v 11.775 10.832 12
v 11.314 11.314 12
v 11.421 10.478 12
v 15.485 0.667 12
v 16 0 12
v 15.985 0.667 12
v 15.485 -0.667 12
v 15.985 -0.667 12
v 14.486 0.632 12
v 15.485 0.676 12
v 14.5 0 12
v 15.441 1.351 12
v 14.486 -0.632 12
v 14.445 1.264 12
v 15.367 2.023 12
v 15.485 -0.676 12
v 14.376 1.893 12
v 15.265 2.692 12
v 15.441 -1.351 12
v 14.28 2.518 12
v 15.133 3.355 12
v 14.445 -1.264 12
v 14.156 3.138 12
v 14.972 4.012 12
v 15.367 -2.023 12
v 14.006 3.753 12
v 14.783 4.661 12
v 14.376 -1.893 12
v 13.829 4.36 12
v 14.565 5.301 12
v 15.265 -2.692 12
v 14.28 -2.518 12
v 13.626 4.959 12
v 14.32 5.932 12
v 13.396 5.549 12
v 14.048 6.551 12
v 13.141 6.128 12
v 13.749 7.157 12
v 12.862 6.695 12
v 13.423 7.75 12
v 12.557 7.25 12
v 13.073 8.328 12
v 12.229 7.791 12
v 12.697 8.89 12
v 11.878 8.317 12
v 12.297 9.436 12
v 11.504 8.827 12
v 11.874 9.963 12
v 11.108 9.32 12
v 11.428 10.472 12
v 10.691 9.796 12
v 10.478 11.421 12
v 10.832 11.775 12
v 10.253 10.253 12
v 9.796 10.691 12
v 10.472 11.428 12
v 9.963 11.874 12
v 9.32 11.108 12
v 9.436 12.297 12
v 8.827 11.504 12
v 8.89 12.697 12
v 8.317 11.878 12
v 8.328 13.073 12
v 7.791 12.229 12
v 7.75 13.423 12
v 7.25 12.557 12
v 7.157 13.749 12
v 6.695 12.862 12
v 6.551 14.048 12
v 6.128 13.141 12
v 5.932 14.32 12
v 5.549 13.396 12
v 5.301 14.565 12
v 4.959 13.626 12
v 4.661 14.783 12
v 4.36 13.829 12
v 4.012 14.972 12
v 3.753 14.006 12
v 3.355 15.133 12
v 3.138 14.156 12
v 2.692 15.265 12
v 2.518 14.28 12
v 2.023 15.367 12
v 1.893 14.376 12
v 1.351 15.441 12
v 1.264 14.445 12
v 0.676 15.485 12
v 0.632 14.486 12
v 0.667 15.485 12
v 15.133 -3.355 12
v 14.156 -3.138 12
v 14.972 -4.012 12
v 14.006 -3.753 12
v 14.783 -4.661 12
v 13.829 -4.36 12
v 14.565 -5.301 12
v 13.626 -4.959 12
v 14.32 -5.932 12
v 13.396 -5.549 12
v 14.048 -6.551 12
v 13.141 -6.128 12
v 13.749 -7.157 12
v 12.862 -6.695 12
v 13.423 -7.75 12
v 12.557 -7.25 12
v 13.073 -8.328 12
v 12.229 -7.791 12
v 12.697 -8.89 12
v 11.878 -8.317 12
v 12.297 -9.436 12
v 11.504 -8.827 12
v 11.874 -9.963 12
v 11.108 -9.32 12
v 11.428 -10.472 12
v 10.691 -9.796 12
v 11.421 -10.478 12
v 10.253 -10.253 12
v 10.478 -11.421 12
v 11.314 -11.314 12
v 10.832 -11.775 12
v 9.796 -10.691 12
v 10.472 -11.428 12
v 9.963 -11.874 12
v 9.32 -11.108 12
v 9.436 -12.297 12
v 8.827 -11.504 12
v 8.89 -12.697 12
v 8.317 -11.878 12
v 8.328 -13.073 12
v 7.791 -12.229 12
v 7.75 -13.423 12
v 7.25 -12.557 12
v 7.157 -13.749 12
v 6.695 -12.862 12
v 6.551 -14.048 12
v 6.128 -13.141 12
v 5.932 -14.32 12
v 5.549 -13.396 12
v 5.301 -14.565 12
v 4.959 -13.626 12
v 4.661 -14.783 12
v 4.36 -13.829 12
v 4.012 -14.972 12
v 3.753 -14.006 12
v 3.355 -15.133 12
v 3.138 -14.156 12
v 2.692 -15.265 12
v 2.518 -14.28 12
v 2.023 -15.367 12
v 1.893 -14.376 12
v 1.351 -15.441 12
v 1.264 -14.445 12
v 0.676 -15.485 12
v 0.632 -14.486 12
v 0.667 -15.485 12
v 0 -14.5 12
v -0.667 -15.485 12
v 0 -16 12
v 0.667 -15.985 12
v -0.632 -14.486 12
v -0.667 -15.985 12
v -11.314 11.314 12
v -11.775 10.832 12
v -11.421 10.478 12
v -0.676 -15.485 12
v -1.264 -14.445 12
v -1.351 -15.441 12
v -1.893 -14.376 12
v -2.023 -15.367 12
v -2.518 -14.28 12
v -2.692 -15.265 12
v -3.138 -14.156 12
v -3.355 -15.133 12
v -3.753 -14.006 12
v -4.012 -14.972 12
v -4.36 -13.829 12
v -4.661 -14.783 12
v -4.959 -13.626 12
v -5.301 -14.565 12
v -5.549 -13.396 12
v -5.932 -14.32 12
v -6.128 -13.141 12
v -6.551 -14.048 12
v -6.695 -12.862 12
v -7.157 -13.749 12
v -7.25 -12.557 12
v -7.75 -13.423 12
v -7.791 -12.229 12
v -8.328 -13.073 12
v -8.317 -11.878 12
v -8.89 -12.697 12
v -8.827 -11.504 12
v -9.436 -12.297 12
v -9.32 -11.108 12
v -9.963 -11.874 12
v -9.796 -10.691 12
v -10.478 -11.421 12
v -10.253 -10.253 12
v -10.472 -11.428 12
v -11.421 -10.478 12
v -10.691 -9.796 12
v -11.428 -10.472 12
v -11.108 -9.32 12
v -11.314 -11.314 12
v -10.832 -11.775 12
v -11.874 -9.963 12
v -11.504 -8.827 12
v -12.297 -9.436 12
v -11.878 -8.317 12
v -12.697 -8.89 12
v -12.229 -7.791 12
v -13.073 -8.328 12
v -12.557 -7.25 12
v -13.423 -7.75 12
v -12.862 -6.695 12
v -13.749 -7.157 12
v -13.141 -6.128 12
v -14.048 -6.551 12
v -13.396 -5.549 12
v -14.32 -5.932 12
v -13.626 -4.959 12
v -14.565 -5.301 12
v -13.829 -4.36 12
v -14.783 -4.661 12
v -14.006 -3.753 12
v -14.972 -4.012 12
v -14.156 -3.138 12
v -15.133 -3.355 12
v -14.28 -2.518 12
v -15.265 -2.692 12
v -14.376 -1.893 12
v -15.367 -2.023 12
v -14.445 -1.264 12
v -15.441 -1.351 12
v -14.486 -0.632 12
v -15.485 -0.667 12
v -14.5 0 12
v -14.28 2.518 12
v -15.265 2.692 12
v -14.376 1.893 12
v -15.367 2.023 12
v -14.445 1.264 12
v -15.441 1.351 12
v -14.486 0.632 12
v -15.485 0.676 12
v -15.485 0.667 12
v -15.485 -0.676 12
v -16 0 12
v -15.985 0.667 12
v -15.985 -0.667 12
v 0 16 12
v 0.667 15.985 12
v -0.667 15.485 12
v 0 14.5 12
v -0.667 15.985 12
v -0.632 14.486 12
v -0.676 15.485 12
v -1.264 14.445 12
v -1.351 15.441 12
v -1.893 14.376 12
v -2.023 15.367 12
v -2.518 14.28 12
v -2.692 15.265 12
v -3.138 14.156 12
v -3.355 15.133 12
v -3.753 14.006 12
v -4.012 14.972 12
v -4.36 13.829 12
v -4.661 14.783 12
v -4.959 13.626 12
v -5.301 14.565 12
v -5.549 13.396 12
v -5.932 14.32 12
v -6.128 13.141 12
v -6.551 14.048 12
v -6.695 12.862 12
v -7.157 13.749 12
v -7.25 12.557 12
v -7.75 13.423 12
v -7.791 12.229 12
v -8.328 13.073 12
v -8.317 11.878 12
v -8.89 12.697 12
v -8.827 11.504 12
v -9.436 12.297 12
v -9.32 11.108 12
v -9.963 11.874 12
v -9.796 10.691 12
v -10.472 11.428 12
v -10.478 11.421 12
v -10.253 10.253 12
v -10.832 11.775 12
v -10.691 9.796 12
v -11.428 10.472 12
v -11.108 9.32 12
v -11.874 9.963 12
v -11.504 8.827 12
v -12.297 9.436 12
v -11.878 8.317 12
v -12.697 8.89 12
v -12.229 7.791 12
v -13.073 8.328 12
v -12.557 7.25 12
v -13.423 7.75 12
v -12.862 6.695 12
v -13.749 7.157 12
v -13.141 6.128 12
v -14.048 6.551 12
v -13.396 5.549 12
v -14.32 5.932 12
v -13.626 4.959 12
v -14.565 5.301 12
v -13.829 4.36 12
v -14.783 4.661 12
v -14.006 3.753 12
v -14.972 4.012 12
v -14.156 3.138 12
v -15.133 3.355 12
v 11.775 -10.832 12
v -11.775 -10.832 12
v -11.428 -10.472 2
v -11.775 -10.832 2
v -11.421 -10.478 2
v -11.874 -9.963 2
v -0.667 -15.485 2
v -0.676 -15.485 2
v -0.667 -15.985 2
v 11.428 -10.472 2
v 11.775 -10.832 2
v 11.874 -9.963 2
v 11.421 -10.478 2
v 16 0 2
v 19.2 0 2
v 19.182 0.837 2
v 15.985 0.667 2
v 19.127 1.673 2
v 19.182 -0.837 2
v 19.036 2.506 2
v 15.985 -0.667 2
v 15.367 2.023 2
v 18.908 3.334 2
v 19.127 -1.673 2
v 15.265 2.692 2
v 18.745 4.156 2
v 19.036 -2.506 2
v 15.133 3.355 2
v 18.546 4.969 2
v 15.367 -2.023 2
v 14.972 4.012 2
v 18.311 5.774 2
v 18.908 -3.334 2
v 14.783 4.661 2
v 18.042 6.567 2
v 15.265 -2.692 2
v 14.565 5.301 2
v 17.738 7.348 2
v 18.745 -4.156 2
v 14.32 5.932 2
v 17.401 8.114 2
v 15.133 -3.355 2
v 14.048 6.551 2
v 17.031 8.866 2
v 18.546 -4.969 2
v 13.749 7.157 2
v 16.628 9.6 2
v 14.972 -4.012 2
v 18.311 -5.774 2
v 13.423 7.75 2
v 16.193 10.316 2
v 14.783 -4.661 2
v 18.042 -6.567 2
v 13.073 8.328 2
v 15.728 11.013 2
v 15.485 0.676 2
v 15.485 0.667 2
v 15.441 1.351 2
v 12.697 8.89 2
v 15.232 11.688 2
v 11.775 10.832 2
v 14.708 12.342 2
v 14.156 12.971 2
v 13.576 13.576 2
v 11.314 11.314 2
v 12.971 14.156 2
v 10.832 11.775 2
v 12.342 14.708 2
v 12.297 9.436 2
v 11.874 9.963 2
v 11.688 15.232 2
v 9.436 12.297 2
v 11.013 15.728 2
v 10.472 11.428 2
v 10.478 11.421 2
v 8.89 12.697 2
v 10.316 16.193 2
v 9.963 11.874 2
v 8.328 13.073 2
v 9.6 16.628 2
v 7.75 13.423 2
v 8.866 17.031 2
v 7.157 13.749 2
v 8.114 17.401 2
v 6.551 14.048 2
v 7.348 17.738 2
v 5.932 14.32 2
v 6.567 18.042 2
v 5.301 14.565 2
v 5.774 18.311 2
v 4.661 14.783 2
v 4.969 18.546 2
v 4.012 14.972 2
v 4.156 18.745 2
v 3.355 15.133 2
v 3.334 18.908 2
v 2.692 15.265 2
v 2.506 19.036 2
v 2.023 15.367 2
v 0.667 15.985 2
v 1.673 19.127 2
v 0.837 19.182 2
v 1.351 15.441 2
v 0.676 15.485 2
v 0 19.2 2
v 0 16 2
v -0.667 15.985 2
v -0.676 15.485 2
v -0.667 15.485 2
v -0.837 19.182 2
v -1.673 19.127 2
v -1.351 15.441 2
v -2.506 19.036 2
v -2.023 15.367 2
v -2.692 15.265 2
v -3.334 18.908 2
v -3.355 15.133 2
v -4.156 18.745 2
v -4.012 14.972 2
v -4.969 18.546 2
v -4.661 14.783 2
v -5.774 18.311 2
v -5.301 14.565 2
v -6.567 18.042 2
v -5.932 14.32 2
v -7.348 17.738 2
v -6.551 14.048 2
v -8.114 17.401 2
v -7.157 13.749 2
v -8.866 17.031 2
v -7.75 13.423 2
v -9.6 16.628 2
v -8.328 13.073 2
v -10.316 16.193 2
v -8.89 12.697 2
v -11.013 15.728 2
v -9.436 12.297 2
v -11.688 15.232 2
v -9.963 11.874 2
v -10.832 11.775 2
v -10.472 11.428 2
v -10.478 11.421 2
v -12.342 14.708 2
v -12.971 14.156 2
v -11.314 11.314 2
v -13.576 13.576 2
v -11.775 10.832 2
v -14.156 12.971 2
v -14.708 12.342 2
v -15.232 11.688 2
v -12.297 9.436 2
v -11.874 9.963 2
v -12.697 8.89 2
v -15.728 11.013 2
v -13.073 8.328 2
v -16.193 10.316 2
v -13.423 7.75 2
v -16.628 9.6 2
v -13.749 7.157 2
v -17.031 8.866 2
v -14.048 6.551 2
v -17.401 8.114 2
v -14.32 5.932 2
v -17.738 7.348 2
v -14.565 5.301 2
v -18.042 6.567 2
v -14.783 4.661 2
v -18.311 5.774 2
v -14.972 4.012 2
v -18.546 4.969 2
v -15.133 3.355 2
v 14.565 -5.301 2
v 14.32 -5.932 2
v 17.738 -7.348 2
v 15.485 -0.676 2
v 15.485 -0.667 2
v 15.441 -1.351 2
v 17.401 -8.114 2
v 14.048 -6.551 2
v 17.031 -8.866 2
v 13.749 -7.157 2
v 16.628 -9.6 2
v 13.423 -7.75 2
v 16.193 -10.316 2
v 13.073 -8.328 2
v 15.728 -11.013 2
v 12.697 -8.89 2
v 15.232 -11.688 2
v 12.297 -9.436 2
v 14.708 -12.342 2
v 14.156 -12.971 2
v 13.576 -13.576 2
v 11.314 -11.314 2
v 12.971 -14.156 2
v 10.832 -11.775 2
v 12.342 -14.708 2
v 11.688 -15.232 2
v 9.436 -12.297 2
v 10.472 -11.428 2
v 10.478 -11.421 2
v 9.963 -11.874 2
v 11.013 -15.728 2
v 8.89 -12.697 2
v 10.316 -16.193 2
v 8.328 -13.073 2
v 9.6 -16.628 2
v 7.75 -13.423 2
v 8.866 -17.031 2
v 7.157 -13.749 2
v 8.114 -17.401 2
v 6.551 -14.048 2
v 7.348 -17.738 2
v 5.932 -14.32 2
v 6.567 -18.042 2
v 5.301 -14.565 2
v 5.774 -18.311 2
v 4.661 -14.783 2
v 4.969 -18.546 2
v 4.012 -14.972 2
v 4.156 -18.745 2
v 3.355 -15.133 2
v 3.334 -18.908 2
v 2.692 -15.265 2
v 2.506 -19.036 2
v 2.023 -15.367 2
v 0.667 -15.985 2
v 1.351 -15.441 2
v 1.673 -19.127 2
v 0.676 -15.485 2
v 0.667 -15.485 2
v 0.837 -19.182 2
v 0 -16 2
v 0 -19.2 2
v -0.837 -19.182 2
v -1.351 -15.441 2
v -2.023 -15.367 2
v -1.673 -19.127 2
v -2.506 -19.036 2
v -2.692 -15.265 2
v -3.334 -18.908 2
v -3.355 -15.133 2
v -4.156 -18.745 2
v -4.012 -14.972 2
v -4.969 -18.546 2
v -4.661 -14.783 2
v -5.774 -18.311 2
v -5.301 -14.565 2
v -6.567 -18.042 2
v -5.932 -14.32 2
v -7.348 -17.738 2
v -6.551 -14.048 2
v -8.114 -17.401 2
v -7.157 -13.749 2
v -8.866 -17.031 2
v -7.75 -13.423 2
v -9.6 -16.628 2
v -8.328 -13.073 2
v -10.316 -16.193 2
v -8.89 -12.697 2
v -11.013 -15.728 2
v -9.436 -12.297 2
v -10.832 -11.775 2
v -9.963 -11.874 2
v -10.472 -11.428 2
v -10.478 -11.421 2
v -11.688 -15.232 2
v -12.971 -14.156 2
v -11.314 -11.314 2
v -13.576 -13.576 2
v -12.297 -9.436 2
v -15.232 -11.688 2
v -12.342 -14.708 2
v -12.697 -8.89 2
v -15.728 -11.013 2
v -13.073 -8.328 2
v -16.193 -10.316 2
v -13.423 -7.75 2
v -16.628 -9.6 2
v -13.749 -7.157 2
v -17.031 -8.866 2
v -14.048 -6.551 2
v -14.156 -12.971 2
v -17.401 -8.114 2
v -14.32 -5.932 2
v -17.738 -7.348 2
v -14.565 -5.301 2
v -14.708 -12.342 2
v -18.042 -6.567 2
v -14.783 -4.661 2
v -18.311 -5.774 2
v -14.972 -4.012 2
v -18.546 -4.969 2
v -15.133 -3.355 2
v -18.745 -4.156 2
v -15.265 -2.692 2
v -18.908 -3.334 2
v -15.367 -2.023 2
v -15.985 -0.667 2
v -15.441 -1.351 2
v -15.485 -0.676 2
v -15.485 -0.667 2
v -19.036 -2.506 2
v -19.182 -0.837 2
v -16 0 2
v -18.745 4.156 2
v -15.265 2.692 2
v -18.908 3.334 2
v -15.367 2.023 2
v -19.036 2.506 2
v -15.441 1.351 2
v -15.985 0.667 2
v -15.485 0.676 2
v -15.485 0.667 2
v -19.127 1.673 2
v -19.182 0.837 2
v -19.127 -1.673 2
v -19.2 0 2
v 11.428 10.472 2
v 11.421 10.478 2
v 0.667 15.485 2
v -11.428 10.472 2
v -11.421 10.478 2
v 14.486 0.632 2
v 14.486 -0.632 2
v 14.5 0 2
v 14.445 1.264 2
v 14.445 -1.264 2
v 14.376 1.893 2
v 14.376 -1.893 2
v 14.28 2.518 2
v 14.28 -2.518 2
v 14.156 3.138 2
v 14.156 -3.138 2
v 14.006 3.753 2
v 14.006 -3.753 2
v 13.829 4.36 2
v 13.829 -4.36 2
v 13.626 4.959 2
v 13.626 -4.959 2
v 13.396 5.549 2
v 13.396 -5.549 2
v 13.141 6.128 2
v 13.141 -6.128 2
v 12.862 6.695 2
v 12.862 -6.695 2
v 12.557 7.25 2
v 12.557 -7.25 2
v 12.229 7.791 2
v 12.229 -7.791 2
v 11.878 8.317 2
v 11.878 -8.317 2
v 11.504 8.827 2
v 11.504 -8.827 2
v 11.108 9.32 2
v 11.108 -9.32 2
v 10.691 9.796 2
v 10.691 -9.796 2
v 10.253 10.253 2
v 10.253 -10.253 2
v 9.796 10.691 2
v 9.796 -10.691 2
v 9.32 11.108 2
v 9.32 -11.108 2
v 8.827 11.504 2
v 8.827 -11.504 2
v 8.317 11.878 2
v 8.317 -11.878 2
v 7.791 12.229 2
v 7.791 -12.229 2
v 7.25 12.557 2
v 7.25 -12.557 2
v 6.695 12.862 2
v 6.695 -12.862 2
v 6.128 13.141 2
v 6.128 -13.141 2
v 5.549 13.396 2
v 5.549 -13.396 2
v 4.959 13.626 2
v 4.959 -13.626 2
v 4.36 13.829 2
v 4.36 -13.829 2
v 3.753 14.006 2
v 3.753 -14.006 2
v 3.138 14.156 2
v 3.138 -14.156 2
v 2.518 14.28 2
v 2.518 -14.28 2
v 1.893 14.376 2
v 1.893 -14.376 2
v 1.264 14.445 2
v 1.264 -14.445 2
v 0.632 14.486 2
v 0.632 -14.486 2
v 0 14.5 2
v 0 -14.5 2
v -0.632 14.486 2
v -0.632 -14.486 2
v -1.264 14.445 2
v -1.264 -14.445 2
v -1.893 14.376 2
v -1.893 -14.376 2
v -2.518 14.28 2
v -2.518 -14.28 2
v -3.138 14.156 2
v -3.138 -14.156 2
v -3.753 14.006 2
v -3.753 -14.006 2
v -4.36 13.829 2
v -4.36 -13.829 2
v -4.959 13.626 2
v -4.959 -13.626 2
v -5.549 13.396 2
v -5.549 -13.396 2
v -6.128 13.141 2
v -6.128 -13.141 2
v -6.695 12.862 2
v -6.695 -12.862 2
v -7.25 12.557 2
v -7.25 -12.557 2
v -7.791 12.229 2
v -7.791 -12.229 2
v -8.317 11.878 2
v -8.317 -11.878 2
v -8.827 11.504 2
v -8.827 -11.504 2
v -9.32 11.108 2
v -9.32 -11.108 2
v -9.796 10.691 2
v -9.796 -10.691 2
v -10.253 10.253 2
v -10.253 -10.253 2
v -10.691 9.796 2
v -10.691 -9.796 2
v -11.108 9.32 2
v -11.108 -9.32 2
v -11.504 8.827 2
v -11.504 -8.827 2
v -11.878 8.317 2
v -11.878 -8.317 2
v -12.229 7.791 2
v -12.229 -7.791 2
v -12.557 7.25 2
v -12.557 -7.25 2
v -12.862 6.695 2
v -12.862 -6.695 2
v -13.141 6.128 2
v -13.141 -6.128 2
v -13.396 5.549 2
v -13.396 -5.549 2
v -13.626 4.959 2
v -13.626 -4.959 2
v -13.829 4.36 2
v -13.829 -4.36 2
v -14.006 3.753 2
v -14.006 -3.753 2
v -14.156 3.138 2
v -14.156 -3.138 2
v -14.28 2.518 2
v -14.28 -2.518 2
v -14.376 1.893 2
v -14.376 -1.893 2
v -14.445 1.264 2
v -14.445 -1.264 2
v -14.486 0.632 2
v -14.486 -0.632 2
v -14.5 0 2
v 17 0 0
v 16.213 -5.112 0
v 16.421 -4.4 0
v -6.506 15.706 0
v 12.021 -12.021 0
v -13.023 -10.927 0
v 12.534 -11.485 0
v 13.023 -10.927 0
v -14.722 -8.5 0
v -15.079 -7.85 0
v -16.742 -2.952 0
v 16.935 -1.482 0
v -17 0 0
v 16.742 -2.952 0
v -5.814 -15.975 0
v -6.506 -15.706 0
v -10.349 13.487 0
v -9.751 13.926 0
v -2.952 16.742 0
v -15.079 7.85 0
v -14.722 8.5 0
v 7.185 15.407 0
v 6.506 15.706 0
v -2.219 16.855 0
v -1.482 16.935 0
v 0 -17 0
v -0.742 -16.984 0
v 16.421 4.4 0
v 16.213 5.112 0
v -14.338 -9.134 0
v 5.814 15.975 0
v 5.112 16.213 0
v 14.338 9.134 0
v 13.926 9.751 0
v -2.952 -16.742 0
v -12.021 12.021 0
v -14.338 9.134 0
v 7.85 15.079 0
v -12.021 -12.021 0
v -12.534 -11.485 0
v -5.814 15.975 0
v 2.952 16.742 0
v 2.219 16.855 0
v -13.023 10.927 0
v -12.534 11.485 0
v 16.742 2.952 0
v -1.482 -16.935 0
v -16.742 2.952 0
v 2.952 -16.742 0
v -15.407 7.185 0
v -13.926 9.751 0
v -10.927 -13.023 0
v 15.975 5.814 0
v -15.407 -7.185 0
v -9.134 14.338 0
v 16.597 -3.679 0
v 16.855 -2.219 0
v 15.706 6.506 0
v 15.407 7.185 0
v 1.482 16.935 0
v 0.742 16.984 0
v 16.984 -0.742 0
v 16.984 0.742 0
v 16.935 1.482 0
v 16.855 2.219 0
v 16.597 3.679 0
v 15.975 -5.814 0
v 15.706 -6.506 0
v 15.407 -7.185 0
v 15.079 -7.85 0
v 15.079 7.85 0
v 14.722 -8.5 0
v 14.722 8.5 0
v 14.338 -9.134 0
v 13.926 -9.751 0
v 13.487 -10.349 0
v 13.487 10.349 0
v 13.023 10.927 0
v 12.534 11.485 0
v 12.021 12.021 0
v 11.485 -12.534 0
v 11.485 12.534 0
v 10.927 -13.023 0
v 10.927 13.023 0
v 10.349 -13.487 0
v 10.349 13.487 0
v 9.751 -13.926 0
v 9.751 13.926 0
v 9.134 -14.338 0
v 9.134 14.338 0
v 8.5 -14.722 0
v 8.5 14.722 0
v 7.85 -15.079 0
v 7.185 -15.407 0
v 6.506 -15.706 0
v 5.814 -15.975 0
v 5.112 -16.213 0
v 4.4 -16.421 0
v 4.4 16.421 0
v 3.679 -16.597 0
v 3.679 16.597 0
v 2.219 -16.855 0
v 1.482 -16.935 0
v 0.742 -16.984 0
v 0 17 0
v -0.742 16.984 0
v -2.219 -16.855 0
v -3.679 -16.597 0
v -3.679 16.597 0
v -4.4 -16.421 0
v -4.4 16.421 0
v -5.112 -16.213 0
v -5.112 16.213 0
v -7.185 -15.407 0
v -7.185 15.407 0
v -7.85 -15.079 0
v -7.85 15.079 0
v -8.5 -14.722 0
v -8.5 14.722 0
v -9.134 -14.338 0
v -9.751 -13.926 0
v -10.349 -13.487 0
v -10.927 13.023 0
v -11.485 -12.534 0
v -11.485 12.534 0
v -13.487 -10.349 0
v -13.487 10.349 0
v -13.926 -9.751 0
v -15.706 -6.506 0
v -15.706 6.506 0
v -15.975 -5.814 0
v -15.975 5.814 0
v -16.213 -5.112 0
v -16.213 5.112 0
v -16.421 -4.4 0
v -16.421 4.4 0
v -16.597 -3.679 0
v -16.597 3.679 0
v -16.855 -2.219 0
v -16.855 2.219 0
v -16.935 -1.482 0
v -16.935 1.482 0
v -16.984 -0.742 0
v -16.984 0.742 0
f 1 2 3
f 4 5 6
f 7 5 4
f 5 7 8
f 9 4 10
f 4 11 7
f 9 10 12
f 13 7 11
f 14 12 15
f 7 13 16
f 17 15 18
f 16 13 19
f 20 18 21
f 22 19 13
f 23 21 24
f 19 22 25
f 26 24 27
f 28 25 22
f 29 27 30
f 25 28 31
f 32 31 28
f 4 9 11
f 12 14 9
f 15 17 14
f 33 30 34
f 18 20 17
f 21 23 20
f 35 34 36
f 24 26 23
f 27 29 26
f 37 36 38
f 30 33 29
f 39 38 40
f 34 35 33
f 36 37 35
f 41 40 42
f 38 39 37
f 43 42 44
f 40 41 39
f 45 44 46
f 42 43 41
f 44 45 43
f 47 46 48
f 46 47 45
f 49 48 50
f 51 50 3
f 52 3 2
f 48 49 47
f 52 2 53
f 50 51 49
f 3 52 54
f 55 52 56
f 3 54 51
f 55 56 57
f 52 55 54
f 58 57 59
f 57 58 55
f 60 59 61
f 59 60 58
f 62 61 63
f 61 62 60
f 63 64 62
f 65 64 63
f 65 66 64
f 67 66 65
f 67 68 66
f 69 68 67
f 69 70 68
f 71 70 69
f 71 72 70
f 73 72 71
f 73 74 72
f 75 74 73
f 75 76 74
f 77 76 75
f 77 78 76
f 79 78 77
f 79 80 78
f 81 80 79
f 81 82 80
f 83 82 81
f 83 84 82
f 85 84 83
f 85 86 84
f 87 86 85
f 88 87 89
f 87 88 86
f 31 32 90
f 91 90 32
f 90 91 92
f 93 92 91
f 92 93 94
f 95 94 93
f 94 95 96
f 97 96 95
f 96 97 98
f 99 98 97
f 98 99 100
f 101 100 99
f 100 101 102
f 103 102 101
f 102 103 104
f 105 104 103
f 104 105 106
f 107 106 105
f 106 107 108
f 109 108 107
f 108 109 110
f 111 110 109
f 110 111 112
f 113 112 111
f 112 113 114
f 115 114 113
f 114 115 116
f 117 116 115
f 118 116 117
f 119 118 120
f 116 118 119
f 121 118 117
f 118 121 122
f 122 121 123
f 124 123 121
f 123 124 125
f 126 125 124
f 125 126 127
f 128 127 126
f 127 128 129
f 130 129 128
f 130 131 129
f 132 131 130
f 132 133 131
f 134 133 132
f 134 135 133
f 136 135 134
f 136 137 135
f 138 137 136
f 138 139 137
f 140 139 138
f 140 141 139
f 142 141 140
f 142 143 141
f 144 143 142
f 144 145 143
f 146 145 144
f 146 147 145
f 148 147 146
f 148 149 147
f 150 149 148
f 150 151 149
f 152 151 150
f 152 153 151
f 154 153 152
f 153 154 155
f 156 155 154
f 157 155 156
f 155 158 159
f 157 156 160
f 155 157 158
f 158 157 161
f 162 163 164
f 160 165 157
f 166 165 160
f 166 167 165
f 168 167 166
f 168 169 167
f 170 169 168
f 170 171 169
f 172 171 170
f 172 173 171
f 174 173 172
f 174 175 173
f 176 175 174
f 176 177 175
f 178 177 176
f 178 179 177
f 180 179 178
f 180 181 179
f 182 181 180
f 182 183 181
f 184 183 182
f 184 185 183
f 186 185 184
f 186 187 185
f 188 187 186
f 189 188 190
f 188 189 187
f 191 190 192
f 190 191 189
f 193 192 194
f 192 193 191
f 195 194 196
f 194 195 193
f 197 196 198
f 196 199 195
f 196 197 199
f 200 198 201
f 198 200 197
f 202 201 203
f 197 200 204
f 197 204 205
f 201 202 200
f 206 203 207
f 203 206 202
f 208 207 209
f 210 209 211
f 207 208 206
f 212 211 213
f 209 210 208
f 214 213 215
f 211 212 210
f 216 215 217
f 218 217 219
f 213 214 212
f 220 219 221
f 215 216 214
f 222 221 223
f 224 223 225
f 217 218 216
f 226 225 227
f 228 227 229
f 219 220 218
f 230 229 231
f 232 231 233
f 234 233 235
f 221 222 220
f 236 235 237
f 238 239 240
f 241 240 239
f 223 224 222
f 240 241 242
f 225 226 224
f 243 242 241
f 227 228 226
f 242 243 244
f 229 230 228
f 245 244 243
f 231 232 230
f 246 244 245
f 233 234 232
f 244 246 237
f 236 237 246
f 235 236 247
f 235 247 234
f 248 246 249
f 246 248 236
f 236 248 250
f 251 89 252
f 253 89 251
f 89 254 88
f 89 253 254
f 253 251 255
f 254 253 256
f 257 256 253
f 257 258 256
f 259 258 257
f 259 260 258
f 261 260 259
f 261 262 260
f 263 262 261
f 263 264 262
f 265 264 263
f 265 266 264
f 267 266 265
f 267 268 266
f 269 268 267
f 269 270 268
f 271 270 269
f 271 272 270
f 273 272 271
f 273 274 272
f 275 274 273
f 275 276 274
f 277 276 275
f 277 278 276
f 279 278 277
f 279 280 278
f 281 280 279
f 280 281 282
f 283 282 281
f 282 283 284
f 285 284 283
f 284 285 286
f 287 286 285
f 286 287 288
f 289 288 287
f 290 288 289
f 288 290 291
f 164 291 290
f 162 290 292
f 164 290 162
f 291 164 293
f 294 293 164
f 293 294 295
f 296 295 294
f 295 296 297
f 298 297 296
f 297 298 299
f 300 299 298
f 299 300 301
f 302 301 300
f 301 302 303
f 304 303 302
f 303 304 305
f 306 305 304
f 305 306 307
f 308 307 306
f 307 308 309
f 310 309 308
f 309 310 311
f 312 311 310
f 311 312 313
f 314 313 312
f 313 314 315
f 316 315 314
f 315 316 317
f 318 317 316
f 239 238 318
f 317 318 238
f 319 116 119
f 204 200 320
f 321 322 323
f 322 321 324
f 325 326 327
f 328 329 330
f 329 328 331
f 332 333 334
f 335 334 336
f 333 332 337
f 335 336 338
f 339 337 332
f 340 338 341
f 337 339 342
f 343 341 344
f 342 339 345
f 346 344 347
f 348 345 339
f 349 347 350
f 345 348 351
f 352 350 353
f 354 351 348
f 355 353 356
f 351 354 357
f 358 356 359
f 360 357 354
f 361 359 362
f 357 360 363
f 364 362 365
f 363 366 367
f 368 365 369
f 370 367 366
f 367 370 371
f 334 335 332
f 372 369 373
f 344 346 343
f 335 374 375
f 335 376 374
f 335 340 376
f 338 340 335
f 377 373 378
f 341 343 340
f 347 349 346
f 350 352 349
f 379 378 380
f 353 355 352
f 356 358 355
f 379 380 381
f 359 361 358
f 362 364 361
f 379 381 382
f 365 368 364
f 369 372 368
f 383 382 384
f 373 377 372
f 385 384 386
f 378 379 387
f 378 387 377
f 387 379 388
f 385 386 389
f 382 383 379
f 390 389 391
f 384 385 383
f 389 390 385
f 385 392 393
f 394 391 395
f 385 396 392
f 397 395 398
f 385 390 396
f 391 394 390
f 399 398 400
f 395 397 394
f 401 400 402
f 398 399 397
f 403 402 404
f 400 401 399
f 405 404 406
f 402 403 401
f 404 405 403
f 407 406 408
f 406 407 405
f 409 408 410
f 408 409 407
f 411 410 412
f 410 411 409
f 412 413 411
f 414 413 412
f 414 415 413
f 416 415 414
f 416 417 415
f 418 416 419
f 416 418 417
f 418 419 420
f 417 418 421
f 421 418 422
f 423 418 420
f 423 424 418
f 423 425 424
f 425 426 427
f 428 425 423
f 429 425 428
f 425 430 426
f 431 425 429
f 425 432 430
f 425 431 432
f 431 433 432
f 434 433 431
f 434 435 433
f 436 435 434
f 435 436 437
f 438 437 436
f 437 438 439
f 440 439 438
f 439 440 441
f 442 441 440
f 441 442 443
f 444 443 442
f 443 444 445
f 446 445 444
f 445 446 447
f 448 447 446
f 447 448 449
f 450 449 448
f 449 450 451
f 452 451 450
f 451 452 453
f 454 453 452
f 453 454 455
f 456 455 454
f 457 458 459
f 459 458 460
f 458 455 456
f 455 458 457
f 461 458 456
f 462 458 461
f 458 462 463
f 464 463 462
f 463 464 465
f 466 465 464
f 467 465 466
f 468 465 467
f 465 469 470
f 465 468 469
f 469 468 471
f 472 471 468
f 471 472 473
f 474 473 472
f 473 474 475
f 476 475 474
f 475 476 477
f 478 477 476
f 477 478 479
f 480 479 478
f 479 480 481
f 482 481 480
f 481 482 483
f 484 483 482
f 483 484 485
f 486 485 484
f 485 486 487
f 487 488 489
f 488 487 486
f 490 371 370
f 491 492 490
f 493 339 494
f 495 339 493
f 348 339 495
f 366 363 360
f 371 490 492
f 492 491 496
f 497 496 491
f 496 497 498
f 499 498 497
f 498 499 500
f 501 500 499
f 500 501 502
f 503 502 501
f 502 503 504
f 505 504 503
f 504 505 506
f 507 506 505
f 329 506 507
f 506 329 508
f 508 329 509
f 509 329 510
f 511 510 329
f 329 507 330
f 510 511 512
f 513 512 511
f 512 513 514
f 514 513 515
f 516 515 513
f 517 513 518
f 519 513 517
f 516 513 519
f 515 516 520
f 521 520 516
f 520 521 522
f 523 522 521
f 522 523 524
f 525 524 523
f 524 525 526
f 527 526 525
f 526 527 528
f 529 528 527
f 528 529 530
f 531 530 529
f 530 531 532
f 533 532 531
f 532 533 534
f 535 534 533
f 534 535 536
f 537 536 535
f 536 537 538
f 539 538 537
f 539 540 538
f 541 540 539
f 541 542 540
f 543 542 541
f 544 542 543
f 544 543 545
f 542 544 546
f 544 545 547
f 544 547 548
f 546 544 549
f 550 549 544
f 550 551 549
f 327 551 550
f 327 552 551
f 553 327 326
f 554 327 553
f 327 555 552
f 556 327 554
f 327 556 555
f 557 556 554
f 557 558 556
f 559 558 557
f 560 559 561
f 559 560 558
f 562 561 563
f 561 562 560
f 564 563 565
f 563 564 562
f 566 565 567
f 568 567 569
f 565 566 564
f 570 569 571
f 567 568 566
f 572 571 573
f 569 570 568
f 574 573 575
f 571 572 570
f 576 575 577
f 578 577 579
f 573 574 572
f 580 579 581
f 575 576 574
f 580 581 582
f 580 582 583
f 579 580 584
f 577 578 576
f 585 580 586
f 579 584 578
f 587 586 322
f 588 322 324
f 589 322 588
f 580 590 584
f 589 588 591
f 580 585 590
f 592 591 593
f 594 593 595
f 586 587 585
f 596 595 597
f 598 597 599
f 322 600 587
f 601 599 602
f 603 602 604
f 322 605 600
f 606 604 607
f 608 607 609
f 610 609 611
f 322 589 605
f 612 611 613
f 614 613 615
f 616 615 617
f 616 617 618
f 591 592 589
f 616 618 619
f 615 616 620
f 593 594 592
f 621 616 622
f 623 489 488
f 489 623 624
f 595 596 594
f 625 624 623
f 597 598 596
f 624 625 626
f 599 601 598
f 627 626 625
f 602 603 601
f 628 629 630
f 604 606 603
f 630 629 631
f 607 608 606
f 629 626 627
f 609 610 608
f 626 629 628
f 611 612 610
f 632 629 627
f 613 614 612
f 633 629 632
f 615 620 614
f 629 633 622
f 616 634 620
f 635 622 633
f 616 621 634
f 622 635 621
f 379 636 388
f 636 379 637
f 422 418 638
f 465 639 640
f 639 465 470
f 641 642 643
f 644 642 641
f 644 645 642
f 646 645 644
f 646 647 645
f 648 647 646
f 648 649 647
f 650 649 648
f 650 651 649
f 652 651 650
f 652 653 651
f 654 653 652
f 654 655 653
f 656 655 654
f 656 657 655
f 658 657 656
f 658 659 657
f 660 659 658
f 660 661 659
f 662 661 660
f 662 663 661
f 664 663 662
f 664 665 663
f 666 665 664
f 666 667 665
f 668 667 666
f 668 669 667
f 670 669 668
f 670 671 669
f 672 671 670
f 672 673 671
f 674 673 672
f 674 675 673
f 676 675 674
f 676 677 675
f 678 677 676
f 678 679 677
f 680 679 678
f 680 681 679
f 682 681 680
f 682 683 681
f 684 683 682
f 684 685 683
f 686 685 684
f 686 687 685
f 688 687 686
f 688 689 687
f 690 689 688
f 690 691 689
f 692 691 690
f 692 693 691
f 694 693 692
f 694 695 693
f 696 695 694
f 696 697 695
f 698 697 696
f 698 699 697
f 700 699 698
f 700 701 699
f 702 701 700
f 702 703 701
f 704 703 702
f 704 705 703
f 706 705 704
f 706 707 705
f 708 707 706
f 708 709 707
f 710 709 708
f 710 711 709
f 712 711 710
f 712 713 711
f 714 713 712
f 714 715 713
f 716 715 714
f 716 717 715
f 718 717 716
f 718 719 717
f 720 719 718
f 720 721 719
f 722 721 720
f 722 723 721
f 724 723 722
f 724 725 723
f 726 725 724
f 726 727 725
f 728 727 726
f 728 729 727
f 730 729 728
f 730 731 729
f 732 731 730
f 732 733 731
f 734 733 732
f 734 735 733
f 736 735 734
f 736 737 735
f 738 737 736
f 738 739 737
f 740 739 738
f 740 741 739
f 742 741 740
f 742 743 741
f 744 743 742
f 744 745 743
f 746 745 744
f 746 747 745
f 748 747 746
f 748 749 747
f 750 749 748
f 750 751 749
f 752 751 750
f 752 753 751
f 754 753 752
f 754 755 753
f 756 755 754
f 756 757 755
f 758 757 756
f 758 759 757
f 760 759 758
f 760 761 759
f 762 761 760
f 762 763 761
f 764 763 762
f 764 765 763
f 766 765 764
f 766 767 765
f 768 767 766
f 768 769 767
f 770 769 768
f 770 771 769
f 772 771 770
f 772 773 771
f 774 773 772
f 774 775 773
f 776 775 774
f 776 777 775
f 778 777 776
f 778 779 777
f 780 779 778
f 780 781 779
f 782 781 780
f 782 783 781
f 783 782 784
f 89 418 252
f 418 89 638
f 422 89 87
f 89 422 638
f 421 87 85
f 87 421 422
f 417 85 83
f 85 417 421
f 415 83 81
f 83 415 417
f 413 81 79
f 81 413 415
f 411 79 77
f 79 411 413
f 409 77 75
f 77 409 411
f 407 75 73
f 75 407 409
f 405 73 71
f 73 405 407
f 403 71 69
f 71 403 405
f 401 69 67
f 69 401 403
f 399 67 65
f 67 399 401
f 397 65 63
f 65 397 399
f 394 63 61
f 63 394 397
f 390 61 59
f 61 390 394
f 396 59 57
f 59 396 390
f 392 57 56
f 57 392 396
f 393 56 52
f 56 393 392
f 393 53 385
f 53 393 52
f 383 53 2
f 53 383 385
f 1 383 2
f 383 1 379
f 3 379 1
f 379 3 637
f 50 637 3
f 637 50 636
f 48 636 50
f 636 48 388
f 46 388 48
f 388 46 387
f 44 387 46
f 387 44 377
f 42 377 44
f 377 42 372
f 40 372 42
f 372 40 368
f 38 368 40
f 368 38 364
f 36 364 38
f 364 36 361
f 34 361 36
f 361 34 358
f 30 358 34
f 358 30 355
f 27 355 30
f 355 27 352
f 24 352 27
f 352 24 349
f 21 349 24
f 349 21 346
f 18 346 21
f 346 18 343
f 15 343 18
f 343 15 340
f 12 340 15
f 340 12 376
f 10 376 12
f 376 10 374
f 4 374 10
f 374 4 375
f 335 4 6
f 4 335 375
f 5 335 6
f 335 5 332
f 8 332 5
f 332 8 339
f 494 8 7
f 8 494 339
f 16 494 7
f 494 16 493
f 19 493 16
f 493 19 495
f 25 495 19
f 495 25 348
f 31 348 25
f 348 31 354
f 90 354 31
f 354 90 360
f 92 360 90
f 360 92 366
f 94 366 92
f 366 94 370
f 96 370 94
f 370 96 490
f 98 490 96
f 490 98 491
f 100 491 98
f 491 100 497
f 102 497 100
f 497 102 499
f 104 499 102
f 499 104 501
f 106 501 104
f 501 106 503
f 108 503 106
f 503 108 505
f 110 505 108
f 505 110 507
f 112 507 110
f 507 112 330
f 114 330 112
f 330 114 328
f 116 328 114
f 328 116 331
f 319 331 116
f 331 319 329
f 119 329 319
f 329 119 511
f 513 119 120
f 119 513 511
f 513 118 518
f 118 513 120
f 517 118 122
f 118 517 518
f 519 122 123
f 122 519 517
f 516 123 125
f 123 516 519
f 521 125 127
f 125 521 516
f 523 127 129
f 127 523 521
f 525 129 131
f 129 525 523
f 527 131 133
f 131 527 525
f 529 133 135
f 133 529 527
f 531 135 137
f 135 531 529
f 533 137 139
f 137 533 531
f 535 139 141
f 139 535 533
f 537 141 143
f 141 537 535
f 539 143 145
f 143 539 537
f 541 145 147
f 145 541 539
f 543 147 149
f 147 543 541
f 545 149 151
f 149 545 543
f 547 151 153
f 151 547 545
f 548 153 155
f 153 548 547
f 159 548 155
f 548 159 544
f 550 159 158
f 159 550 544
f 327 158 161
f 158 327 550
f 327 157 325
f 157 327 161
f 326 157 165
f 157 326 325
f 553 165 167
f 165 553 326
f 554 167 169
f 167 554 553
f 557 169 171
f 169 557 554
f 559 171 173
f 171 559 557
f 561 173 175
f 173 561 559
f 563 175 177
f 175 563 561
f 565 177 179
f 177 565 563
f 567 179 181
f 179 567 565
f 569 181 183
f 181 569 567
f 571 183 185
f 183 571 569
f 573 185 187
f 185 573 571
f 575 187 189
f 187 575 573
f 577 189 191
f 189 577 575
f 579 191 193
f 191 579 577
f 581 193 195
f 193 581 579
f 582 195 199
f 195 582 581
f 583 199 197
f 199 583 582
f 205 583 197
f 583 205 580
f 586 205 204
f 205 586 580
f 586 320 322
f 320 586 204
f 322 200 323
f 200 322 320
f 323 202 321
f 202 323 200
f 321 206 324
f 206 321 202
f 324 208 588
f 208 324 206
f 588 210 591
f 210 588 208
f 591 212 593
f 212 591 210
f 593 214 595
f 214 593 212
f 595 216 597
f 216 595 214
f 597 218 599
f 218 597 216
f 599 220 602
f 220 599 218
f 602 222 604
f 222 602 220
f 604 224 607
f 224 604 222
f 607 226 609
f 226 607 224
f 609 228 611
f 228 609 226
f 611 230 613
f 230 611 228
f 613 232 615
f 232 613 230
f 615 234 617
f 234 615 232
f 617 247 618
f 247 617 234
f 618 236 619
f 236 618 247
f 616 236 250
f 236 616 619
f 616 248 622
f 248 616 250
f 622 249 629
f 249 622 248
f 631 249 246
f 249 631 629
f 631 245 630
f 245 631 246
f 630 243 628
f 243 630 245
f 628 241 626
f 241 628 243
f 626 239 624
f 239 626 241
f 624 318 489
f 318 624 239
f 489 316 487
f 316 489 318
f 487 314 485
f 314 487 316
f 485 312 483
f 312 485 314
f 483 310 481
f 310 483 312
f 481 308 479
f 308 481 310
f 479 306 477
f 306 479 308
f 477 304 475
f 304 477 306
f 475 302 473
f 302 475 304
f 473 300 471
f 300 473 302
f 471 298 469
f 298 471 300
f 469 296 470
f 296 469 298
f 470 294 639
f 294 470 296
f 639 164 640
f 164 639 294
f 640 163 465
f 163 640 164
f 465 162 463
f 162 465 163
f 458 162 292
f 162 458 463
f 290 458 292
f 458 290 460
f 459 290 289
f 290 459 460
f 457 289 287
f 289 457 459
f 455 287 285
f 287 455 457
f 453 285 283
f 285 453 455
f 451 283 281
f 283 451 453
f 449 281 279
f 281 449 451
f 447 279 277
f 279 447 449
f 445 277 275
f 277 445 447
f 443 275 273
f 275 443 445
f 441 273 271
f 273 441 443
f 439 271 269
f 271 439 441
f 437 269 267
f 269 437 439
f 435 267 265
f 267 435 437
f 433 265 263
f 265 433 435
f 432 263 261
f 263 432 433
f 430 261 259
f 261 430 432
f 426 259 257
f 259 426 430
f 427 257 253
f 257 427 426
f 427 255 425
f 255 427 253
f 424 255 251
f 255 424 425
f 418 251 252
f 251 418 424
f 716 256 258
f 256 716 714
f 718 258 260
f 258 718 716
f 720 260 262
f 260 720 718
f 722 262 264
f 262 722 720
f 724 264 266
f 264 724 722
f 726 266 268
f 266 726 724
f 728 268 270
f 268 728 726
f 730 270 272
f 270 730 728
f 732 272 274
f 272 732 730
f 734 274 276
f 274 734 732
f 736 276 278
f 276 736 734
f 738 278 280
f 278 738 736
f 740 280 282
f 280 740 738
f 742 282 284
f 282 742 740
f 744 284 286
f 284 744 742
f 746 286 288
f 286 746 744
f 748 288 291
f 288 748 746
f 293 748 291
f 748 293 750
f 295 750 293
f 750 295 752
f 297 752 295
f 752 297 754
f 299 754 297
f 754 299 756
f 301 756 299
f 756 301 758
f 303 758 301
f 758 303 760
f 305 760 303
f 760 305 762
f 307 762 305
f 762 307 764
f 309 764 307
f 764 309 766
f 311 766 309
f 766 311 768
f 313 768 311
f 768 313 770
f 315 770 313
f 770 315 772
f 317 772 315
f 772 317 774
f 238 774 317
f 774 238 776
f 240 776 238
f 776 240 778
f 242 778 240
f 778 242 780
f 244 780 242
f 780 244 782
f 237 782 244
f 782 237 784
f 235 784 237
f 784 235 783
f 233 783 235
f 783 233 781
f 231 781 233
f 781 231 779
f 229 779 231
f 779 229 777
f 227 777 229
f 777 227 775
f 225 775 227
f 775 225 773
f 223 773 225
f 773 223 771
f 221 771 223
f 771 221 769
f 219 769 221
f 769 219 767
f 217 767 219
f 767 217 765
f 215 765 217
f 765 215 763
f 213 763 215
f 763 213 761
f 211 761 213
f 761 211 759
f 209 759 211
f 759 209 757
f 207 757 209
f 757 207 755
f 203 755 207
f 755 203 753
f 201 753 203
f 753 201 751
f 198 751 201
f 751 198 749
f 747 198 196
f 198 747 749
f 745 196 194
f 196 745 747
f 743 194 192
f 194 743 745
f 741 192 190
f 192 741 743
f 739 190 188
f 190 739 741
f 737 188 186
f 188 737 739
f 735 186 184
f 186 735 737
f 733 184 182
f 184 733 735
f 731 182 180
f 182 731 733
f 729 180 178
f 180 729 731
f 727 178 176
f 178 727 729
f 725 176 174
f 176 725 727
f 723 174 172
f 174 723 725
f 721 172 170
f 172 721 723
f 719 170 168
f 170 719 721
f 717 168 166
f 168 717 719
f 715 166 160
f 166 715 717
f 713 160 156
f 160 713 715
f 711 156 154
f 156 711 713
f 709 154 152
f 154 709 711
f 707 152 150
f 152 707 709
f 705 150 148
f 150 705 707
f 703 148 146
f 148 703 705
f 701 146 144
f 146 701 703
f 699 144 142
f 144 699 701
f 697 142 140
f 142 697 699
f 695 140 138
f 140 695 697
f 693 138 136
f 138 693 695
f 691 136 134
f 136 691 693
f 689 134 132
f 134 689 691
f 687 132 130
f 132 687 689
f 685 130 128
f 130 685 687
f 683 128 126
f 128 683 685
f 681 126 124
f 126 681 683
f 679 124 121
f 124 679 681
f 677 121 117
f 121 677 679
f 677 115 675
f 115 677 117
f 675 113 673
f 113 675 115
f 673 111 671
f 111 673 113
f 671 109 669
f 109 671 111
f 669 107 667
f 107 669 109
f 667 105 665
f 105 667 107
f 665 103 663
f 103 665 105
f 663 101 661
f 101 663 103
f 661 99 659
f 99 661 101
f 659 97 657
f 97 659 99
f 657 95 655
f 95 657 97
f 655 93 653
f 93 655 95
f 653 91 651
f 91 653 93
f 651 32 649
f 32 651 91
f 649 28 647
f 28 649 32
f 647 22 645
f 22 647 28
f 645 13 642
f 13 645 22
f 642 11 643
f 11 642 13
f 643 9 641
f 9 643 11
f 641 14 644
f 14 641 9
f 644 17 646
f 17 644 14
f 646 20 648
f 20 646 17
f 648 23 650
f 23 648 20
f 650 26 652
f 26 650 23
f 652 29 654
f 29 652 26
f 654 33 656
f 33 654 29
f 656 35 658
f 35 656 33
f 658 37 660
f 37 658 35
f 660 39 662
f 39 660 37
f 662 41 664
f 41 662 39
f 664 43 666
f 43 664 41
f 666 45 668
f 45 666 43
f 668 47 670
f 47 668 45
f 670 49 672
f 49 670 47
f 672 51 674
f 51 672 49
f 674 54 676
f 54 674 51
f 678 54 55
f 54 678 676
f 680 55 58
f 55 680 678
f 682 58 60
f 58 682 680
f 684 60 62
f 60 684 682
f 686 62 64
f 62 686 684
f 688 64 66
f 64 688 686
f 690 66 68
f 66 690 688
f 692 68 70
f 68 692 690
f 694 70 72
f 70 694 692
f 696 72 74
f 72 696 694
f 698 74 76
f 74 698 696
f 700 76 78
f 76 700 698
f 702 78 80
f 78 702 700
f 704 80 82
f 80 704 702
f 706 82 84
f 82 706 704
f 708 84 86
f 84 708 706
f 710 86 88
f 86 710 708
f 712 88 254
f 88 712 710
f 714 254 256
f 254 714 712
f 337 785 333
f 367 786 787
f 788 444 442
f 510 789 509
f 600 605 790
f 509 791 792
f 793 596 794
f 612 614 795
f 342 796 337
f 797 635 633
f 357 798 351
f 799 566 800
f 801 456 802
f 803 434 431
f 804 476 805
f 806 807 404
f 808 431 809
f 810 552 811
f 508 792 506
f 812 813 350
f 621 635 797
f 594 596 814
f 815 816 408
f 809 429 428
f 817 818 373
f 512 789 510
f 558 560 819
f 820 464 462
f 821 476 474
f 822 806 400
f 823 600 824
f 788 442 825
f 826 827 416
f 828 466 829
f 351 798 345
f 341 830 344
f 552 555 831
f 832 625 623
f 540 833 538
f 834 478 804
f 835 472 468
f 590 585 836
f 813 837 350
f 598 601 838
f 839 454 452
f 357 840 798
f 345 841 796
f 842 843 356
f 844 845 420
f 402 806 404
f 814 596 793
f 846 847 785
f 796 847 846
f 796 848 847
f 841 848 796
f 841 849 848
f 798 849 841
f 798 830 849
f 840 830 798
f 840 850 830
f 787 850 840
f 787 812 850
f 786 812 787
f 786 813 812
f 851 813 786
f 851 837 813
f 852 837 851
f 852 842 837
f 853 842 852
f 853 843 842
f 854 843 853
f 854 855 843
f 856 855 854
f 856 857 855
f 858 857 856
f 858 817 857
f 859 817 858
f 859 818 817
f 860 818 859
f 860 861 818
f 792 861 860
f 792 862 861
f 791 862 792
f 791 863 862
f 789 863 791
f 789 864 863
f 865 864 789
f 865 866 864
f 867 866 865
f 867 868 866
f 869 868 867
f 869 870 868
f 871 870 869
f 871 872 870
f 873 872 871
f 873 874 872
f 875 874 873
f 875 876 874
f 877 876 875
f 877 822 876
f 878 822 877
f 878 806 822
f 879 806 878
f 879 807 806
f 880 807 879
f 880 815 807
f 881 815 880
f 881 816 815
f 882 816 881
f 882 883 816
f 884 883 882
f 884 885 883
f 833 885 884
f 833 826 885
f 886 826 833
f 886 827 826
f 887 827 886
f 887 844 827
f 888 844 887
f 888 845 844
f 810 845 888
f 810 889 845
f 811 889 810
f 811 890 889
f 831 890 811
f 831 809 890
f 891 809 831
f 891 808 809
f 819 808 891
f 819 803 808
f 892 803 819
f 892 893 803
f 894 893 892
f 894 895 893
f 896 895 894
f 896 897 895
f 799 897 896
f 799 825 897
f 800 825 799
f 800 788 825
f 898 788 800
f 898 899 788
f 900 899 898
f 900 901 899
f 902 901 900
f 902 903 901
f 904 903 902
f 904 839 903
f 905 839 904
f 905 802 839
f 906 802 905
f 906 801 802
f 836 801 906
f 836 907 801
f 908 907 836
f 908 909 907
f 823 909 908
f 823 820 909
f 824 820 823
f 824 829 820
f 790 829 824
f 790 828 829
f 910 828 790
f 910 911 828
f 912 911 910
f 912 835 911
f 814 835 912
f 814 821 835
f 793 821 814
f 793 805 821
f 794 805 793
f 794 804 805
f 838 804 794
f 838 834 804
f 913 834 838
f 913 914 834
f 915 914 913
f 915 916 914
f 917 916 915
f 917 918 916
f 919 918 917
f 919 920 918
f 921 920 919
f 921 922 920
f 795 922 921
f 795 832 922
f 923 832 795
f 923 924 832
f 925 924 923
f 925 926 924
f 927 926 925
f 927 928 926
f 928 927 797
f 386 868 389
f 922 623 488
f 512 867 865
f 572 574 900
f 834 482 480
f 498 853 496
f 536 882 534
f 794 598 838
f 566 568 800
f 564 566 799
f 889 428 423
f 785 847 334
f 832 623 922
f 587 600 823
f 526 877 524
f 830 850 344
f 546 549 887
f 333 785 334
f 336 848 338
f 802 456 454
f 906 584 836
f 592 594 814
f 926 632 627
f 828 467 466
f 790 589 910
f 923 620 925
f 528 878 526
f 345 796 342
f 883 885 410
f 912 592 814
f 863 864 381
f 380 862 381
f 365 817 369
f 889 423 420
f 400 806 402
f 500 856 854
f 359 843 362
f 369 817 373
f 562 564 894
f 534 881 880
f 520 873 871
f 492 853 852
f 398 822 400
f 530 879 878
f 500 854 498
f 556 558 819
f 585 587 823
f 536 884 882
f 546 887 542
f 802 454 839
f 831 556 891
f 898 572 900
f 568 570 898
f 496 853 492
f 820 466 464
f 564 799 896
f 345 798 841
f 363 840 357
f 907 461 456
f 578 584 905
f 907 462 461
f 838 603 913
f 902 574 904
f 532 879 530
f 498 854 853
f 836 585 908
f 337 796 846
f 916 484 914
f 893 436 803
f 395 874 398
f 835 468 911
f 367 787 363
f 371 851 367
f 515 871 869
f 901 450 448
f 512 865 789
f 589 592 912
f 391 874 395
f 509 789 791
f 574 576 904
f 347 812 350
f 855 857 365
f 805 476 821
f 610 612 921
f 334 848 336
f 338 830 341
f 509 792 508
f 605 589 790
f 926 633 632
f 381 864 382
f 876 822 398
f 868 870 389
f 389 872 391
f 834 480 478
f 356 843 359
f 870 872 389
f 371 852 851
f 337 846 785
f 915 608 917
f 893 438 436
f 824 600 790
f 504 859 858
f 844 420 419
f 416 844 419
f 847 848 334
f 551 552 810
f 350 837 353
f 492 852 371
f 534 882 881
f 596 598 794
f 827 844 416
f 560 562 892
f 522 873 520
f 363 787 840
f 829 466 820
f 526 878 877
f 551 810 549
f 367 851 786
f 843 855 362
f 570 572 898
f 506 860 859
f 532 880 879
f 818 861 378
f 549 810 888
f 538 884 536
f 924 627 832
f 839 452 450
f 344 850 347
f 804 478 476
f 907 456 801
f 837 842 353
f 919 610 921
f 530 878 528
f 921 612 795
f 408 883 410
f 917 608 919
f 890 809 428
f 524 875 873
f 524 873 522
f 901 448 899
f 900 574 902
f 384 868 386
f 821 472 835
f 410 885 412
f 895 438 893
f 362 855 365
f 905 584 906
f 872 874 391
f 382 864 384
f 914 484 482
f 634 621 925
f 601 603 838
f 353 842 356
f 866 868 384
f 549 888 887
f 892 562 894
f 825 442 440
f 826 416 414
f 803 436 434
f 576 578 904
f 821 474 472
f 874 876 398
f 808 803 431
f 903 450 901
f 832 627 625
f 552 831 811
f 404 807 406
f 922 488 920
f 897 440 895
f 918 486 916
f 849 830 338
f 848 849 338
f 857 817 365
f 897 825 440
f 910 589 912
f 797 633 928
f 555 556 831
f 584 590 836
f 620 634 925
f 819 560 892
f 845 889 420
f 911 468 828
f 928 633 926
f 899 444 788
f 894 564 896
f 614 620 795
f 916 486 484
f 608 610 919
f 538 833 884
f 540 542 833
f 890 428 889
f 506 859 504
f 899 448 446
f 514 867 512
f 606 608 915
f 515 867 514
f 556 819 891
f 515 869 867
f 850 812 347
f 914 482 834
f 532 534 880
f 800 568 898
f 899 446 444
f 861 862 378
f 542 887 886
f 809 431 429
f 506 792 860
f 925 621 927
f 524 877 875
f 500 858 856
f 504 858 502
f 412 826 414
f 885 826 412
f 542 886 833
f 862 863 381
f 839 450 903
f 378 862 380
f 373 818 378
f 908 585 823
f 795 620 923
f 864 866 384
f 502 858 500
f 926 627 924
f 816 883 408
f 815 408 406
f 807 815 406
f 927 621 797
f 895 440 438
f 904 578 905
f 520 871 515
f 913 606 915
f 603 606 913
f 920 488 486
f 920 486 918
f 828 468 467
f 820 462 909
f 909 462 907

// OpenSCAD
//External Diameter (equal to the diameter of the hole where you'll insert this cap)
Diameter=32; // [1:100]

//Teeth protruding
TeethExt=1; // [0.1:0.1:10]

//How much teeth?
TeethExtCount=8; // [0:36]

//Thickness of the cylinder's perimeter that will be in the hole
Thickness=2; // [0.1:0.1:10]

//Height of the part that will be inserted in the hole
Height=10; // [0.1:0.1:100]

/* [Hidden] */
//Segments number in circles
Segments=144;

translate([0,0,Height+Diameter/16])
rotate([180,0,0])
union(){
    linear_extrude(height=Height, convexity=10)
    difference(){
        intersection(){
            union(){
                circle($fn=Segments,d=Diameter-TeethExt);
                for(r=[0:360/TeethExtCount:360])
                    rotate(a=r, v=[0,0,1])
                        square(size=[Diameter/24, Diameter*1.5], center=true);
                
            }
            circle($fn=Segments,d=Diameter);
        }
        circle($fn=Segments,d=Diameter-Thickness-TeethExt);
    }
    translate([0,0,Height])
        cylinder($fn=Segments,h=Diameter/16, d1=Diameter+Diameter/5, d2=Diameter+Diameter/16);
}
